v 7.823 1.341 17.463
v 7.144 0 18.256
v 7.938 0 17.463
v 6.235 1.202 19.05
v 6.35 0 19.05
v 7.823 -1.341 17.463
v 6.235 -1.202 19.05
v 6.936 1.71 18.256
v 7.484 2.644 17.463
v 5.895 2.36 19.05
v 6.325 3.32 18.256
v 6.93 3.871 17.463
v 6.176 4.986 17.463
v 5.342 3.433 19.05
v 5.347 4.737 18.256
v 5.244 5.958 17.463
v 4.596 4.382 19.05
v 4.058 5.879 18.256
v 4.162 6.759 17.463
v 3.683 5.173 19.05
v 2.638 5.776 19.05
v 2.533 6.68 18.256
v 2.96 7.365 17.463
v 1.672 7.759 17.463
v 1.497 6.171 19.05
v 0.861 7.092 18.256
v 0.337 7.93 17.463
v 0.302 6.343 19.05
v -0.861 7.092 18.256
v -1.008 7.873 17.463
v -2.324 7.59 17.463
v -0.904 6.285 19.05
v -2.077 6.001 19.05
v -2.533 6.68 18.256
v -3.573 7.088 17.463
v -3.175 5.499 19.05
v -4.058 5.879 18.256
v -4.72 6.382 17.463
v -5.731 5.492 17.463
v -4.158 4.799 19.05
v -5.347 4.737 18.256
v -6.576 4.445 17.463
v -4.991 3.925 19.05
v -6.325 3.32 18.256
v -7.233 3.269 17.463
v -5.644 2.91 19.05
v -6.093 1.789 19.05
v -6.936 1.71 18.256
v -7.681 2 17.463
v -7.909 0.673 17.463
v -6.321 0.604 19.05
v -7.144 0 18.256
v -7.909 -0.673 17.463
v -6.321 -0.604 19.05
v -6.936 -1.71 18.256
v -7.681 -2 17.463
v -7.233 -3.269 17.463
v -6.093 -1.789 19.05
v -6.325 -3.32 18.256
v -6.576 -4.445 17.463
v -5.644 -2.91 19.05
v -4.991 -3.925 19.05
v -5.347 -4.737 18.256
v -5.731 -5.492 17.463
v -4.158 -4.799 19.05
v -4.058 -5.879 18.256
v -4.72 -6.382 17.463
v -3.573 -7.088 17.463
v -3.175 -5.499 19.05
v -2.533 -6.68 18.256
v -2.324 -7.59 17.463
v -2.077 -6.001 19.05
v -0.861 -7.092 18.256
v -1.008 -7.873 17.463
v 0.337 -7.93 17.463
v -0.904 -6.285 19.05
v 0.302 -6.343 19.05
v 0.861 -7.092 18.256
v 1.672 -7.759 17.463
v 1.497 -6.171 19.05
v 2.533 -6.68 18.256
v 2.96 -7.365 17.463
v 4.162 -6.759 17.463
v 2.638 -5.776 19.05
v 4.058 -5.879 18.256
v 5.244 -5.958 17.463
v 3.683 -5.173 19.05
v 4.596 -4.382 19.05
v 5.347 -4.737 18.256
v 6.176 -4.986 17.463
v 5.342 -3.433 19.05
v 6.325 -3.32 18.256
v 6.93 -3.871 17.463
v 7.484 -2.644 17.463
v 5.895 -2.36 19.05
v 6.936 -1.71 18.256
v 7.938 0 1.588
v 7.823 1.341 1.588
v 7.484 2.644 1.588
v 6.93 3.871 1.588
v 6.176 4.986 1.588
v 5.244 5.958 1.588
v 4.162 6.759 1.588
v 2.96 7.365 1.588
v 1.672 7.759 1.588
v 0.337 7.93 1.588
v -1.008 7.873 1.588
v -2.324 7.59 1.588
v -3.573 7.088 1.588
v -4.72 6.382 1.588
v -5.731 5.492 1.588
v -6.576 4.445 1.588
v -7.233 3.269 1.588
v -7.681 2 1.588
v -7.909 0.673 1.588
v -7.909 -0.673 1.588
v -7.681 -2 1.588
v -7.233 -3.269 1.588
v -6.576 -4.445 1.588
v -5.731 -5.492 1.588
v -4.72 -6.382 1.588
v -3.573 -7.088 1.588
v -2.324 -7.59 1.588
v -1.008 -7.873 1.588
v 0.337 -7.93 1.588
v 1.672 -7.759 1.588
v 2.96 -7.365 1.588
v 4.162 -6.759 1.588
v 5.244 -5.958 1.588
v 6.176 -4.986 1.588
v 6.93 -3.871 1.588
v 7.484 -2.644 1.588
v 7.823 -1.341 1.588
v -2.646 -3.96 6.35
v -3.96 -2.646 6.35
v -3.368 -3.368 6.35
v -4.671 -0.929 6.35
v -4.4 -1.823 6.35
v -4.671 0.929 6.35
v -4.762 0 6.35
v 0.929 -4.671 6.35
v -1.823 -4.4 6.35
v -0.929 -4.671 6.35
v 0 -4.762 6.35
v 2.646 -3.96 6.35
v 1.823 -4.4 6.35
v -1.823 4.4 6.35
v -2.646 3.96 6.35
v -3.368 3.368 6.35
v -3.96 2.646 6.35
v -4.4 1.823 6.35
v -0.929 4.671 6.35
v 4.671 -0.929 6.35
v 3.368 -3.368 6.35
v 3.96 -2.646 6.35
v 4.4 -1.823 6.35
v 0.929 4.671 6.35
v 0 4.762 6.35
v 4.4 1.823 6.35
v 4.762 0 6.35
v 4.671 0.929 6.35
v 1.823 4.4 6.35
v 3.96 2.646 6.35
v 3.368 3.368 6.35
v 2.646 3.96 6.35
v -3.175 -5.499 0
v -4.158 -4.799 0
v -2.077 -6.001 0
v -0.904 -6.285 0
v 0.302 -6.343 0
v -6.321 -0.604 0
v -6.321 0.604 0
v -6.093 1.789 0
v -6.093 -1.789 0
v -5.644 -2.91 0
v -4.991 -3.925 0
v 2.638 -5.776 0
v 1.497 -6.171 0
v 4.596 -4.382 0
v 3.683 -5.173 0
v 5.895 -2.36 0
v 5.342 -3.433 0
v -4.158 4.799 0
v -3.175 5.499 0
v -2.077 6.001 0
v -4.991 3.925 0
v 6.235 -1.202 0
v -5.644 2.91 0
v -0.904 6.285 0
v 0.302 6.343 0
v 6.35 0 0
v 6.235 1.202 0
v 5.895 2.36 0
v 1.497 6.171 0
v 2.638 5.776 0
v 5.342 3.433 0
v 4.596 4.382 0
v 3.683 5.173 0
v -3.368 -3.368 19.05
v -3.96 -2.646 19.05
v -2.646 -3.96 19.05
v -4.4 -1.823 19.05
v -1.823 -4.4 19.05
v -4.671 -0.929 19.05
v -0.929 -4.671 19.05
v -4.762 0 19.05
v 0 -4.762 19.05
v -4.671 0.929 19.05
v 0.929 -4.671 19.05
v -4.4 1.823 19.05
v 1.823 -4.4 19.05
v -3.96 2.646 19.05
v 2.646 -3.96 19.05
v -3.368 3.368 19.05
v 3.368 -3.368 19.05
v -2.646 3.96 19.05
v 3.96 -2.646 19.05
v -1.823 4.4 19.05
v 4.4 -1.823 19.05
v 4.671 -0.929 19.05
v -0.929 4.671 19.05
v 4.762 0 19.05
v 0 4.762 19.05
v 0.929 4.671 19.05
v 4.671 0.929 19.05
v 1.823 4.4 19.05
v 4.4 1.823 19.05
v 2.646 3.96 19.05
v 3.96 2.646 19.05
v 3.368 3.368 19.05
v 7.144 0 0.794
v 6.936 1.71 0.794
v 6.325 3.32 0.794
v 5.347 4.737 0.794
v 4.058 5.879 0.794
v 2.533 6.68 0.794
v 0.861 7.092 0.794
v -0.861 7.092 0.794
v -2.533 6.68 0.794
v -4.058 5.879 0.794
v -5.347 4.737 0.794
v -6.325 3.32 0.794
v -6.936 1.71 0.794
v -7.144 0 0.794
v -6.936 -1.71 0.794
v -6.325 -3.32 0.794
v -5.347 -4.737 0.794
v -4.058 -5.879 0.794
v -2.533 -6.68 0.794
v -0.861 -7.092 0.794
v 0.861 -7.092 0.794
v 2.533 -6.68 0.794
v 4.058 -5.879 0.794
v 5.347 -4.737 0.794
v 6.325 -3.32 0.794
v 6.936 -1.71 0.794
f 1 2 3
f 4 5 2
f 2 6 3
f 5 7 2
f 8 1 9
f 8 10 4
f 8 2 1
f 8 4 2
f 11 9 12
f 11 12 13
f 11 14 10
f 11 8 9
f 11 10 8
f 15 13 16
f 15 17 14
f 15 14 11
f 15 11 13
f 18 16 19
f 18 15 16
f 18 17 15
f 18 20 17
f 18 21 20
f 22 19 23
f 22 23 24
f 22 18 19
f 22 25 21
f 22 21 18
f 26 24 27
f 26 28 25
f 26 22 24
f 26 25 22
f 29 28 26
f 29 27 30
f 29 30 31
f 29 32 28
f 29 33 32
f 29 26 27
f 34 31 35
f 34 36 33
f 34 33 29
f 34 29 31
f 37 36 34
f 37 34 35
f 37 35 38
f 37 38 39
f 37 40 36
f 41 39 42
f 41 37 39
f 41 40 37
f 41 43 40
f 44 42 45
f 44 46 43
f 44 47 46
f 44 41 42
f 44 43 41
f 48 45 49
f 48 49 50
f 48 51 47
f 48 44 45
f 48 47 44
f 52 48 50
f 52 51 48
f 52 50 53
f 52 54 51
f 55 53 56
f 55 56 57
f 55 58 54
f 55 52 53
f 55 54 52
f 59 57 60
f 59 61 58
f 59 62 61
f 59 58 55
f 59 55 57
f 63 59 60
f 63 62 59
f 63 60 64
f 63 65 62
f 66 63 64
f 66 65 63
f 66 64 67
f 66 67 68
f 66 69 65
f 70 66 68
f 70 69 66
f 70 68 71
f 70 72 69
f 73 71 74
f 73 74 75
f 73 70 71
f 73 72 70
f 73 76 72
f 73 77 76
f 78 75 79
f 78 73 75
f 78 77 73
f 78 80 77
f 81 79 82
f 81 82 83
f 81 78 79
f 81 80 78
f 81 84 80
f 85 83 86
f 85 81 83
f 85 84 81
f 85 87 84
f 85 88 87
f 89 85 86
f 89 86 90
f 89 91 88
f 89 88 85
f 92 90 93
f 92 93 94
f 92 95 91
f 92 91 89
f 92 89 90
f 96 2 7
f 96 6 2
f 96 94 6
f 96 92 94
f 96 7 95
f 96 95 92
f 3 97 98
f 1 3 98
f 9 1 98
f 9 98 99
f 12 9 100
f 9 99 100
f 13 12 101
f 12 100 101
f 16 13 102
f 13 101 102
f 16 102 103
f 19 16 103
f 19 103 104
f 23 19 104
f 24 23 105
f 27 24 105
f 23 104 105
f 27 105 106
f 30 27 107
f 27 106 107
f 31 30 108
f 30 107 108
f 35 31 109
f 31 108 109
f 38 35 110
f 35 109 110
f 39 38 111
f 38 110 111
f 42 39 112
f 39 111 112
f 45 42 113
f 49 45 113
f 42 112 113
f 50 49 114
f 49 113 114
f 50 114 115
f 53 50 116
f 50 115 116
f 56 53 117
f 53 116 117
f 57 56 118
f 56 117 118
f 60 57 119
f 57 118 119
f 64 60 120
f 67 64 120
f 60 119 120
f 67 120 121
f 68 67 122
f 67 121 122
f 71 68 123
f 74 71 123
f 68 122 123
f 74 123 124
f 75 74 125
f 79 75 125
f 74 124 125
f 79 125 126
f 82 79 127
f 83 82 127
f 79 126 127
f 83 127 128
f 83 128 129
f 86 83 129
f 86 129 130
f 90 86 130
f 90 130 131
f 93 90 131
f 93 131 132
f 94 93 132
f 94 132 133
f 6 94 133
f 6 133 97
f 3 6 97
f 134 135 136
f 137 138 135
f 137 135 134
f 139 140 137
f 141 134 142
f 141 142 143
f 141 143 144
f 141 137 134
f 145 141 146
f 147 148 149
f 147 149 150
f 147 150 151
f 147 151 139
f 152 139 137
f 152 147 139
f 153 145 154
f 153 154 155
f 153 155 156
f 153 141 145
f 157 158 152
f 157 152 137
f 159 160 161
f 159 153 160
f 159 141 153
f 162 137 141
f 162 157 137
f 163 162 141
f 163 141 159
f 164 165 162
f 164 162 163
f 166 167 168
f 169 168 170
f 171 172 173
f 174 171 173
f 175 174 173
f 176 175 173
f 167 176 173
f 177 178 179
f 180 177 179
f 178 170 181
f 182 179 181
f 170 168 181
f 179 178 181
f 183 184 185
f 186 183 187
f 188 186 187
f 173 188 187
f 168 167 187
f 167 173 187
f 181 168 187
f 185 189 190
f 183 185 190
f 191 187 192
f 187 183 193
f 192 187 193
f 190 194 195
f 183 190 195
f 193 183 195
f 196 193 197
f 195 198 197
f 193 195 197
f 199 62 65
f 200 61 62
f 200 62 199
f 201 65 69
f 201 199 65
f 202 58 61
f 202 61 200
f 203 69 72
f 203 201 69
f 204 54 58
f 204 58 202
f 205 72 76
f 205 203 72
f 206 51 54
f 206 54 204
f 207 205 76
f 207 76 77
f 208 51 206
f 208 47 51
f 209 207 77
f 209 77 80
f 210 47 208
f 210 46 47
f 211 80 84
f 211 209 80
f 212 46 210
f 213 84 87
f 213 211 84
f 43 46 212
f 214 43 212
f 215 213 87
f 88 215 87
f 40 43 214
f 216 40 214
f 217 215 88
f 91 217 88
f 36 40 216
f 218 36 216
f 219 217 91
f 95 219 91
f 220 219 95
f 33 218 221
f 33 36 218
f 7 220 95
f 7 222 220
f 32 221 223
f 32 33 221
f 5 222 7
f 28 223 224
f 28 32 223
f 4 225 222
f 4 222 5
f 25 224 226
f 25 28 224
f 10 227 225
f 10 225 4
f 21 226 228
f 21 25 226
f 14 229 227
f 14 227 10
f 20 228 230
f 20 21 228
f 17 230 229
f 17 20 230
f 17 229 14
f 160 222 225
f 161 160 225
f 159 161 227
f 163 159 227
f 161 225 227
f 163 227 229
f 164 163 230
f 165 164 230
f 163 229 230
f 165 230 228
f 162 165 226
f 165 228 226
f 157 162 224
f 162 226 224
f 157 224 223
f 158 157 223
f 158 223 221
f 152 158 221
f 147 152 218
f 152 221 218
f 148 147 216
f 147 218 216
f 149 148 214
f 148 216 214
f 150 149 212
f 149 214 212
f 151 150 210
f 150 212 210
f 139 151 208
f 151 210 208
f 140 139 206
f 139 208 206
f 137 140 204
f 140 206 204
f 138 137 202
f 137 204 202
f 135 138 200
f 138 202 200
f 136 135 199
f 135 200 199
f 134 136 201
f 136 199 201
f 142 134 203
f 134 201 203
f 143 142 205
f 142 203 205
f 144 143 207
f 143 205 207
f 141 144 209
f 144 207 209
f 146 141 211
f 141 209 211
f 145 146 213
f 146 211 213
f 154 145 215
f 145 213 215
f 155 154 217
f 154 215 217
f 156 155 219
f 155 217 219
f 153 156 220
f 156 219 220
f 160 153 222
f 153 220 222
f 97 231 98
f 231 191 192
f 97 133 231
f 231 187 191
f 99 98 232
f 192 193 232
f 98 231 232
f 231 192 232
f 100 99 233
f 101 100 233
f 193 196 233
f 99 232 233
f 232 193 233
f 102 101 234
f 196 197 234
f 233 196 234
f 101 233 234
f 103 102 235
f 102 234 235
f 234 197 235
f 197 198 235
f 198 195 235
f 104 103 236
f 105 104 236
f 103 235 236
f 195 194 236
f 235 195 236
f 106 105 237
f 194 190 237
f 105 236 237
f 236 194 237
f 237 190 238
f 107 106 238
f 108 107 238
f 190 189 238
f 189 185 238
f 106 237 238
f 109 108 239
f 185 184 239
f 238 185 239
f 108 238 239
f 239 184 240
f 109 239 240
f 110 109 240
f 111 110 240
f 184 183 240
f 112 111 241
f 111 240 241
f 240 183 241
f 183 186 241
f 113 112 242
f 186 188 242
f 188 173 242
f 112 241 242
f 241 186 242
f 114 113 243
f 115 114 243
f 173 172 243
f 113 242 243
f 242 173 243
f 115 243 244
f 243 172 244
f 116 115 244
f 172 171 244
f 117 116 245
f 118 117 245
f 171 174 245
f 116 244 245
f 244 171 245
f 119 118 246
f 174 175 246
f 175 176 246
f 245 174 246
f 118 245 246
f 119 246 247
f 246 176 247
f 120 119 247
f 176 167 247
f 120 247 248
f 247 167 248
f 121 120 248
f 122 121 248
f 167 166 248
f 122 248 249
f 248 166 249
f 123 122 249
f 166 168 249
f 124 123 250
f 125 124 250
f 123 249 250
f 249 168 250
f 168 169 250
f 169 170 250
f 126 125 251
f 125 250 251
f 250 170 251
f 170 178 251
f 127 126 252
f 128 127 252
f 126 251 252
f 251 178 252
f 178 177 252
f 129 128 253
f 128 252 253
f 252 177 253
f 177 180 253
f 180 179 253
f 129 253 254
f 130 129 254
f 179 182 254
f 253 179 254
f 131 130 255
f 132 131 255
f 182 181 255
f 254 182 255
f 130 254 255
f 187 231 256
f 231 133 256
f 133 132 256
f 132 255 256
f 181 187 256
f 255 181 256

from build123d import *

# Parameters (mm, degrees)
SKETCH1_R           = 7.9375
BOSS_EXTRUDE1_DEPTH = 19.05
SKETCH2_R           = 4.7625
CUT_EXTRUDE1_DEPTH  = 12.7
CHAMFER1_SIZE       = 1.5875


with BuildPart() as part:
    # Sketch1 → Boss-Extrude1 (new body)
    with BuildSketch(Plane.XY):
        Circle(SKETCH1_R)
    extrude(amount=BOSS_EXTRUDE1_DEPTH)

    # Sketch2 → Cut-Extrude1 (cut)
    with BuildSketch(Plane.XY.offset(19.05)):
        Circle(SKETCH2_R)
    extrude(amount=-CUT_EXTRUDE1_DEPTH, mode=Mode.SUBTRACT)

    # Chamfer1
    chamfer1_edges = [part.edges().sort_by_distance(p)[0] for p in [
        (-7.9375, 0, 0),
        (-7.9375, 0, 19.05),
    ]]
    chamfer(chamfer1_edges, length=CHAMFER1_SIZE)


solid = part.part
